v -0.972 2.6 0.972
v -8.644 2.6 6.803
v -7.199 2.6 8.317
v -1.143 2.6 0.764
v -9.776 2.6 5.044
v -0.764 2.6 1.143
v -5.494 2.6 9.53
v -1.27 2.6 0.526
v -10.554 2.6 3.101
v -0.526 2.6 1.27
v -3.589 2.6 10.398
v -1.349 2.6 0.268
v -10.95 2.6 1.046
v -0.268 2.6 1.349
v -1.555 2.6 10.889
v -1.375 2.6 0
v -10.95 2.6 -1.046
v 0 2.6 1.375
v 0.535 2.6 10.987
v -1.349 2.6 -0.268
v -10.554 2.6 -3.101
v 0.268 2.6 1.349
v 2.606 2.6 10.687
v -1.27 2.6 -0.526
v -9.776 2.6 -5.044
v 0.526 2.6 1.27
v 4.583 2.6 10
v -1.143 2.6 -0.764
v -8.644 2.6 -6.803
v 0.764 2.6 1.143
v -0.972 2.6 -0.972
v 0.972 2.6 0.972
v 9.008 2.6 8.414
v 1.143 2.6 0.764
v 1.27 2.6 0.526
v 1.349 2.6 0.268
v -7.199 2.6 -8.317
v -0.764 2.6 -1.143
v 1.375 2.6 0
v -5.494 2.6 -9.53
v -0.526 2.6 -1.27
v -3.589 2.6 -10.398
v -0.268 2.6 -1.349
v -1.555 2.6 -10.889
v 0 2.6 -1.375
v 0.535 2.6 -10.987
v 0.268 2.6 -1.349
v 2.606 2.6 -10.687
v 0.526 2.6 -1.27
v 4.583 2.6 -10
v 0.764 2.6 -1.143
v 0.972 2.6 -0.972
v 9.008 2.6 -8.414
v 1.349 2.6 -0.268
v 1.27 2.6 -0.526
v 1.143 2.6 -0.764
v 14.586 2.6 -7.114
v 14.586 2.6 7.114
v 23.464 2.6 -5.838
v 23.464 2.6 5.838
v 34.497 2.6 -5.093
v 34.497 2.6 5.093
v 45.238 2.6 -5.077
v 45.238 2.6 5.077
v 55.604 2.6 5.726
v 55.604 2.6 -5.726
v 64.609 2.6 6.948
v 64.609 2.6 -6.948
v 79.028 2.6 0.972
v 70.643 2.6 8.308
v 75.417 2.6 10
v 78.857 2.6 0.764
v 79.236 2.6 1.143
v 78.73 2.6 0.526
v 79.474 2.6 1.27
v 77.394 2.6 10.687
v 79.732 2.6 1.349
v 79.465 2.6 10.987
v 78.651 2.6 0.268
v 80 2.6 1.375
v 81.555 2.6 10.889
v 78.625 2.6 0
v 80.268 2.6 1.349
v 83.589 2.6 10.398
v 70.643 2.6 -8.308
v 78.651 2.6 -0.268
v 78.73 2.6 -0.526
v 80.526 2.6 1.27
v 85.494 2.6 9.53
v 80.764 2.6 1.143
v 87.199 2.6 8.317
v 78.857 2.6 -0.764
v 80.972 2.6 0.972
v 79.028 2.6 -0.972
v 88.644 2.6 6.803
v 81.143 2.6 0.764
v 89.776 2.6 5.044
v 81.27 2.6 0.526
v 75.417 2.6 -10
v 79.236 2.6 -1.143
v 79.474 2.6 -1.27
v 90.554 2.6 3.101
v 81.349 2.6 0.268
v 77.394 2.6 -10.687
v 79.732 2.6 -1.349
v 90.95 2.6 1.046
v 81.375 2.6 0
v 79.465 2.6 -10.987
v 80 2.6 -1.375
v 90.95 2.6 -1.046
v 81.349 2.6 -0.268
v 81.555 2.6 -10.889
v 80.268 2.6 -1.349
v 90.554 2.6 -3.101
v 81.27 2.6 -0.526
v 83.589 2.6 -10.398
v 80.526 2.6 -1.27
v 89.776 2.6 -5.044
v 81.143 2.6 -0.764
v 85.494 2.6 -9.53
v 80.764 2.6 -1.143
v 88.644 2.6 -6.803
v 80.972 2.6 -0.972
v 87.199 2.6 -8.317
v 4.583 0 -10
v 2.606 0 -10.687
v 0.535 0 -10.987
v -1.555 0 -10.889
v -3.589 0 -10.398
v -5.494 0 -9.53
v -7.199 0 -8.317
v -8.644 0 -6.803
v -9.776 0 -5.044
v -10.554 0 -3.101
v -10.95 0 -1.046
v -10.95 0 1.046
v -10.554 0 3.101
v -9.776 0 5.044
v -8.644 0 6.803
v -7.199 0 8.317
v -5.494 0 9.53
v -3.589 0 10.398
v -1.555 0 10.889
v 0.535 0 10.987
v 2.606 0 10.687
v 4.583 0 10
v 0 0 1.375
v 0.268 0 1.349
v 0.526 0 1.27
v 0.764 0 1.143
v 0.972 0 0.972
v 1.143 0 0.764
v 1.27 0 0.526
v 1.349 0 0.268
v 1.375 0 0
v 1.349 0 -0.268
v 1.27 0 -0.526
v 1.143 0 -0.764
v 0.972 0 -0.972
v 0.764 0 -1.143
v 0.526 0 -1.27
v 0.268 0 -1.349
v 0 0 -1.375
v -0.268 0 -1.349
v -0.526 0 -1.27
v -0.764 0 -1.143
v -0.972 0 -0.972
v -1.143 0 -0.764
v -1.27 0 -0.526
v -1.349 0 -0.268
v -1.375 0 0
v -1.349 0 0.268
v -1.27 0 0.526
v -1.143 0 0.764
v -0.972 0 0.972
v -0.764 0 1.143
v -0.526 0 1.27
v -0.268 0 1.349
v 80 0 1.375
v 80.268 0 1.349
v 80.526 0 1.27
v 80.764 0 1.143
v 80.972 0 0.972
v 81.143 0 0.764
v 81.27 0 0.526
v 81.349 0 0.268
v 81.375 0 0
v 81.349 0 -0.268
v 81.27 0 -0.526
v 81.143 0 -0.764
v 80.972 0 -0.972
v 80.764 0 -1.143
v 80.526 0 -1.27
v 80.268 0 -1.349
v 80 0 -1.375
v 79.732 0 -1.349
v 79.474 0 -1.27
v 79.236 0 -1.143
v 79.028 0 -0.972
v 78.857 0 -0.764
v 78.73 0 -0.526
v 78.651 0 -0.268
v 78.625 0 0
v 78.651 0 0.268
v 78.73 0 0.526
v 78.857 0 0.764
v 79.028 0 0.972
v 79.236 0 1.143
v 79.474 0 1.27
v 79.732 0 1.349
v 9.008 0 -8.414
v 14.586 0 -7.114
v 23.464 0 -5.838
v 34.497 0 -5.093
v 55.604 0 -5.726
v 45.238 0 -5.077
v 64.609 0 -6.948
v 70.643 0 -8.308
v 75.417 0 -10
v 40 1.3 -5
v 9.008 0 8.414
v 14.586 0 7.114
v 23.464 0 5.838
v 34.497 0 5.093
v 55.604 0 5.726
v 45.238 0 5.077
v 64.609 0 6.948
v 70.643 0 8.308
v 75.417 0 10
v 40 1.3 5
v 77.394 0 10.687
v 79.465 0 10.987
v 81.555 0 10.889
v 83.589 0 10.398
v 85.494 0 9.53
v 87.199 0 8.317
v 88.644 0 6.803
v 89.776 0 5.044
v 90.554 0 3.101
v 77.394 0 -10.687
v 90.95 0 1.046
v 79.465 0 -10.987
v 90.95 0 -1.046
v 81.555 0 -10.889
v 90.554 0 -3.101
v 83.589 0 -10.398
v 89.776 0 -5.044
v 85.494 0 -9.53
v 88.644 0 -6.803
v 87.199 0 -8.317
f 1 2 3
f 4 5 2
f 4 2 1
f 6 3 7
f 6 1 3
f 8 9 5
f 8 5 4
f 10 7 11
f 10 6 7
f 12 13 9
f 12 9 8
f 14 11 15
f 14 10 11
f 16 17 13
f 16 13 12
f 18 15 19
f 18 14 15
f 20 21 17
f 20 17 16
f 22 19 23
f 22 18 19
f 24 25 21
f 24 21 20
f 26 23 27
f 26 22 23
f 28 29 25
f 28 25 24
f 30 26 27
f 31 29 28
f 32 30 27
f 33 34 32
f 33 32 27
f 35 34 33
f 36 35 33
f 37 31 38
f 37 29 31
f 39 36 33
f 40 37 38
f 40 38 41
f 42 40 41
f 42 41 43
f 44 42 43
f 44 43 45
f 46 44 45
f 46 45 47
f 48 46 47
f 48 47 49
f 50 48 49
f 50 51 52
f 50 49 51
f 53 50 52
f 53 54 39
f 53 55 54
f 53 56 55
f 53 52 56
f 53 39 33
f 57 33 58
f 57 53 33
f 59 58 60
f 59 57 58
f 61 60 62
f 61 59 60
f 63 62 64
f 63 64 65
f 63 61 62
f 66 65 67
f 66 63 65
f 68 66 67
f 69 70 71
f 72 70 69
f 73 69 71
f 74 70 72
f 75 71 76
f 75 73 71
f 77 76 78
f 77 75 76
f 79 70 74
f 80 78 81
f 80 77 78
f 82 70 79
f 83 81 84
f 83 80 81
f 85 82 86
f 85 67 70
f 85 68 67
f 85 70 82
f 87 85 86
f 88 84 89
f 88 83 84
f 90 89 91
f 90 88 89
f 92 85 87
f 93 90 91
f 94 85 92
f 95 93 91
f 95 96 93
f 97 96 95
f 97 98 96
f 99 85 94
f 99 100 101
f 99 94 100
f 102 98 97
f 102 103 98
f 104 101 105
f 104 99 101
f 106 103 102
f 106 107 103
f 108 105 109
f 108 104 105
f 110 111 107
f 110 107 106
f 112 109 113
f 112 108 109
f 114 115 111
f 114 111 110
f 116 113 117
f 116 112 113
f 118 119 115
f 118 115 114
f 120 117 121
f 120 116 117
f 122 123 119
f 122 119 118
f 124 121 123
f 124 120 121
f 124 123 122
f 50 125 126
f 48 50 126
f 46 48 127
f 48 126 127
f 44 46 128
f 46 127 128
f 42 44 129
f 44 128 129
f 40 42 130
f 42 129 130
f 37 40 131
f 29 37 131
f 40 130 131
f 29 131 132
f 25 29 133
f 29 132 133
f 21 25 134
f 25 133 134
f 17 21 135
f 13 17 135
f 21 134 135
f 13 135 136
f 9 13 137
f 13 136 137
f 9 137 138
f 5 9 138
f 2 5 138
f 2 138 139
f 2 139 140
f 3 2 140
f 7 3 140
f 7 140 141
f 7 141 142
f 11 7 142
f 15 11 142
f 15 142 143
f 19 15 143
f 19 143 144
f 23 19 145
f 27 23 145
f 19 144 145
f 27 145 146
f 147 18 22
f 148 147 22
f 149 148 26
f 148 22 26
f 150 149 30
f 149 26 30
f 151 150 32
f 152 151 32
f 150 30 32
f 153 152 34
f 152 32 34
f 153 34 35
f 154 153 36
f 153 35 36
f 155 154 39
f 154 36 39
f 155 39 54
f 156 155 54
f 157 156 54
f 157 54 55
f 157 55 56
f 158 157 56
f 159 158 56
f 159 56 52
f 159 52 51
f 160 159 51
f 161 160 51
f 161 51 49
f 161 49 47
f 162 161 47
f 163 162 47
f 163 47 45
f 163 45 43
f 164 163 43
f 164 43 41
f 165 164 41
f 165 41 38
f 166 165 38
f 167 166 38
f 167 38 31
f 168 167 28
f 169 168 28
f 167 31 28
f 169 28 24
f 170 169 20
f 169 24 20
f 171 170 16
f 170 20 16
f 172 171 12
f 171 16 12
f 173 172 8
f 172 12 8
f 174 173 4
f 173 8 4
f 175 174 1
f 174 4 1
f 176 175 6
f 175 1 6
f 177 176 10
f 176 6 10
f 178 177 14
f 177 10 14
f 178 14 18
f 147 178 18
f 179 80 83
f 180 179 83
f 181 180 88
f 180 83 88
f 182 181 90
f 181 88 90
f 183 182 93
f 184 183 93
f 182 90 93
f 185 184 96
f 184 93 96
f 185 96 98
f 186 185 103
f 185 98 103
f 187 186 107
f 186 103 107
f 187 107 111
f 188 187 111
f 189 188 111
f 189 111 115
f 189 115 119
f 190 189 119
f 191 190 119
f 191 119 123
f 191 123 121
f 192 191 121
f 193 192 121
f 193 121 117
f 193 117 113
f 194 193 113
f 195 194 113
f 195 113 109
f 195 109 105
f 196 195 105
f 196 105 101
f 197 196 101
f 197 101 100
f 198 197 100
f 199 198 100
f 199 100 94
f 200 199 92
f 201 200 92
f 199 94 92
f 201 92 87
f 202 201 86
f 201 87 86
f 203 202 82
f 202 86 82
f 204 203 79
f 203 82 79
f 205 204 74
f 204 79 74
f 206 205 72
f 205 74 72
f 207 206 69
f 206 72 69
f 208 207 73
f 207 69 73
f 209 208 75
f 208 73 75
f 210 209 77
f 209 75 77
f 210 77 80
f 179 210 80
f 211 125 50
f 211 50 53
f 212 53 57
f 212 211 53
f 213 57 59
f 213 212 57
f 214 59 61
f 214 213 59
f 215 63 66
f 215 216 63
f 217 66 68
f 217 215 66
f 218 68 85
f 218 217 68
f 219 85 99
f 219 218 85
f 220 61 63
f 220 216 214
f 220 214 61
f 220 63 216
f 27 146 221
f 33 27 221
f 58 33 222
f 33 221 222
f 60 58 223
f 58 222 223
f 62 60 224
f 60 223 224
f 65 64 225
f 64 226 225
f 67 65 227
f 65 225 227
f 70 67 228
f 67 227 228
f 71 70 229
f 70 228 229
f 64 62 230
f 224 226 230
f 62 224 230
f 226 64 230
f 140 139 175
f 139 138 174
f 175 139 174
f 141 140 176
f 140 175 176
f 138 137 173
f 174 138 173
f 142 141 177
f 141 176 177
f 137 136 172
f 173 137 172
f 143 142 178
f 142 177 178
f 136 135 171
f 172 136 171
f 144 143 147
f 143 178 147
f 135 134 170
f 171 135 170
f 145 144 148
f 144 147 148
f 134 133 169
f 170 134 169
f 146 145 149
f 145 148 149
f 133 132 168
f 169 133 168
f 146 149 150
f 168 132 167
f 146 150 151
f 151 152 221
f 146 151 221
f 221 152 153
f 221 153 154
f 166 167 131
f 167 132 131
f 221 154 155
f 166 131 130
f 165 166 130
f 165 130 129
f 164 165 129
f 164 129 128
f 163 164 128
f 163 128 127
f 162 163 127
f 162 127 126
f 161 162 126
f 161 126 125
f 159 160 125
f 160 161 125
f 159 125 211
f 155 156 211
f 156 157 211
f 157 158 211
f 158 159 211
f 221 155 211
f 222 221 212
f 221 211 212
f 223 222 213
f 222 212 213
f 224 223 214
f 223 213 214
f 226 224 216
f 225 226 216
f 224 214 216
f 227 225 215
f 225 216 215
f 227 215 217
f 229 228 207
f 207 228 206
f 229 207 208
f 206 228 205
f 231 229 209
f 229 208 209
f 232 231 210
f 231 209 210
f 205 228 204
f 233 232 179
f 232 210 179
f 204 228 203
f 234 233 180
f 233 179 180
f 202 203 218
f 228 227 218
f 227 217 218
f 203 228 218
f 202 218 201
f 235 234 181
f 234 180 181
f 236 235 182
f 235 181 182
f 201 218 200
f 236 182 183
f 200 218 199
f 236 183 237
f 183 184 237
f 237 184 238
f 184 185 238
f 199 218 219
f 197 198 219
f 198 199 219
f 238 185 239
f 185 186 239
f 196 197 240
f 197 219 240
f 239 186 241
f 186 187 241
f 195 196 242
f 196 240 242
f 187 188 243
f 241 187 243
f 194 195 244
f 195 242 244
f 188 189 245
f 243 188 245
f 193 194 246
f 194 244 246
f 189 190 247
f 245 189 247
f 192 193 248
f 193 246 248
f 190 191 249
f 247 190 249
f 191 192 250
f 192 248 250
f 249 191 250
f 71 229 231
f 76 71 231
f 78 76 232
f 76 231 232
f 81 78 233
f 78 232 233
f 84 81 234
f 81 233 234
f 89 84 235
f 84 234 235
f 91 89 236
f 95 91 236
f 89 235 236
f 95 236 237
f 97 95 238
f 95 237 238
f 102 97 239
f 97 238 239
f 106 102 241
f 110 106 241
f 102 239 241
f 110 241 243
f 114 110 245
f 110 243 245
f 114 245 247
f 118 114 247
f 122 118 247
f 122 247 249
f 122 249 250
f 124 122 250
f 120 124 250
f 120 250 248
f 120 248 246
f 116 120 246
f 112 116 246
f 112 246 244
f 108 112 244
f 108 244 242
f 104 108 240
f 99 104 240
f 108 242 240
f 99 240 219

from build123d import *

# Parameters (mm, degrees)
BOSS_EXTRUDE1_DEPTH = 2.6
CUT_EXTRUDE1_REACH  = 93.699
SKETCH3_R           = 1.375


with BuildPart() as part:
    # Sketch1 → Boss-Extrude1 (new body)
    with BuildSketch(Plane(origin=(0, 0, 0), x_dir=(1, 0, 0), z_dir=(0, 1, 0))):
        with BuildLine():
            ThreePointArc((4.582575695, 10), (-11, 0), (4.582575695, -10))
            add(Edge.make_bspline(
                [(4.582575695, -10), (11.56314995, -6.801099008), (40.099315353, -3.216443036), (68.360107676, -6.765931234), (75.417424305, -10)],
                knots=[0, 0, 0, 0, 0.499463492, 1, 1, 1, 1], degree=3))
            ThreePointArc((75.417424305, -10), (91, 0), (75.417424305, 10))
            add(Edge.make_bspline(
                [(4.582575695, 10), (11.56314995, 6.801099008), (40.099315353, 3.216443036), (68.360107676, 6.765931234), (75.417424305, 10)],
                knots=[0, 0, 0, 0, 0.499463492, 1, 1, 1, 1], degree=3))
        make_face()
    extrude(amount=BOSS_EXTRUDE1_DEPTH)

    # Sketch3 → Cut-Extrude1 (cut, up to next)
    with BuildSketch(Plane(origin=(0, 2.6, 0), x_dir=(1, 0, 0), z_dir=(0, 1, 0)), mode=Mode.PRIVATE) as cut_extrude1_sk1:
        with Locations(Location((0, 0, 0), (0, 0, 270))):
            Circle(SKETCH3_R)
    cut_extrude1_tool1 = extrude(cut_extrude1_sk1.sketch, amount=-CUT_EXTRUDE1_REACH, mode=Mode.PRIVATE) & part.part
    # Sketch3 → Cut-Extrude1 (cut, up to next)
    with BuildSketch(Plane(origin=(0, 2.6, 0), x_dir=(1, 0, 0), z_dir=(0, 1, 0)), mode=Mode.PRIVATE) as cut_extrude1_sk2:
        with Locations(Location((80, 0, 0), (0, 0, 270))):
            Circle(SKETCH3_R)
    cut_extrude1_tool2 = extrude(cut_extrude1_sk2.sketch, amount=-CUT_EXTRUDE1_REACH, mode=Mode.PRIVATE) & part.part
    add(cut_extrude1_tool1.solids().sort_by_distance((0, 2.6, 0))[0], mode=Mode.SUBTRACT)
    add(cut_extrude1_tool2.solids().sort_by_distance((80, 2.6, 0))[0], mode=Mode.SUBTRACT)


solid = part.part
